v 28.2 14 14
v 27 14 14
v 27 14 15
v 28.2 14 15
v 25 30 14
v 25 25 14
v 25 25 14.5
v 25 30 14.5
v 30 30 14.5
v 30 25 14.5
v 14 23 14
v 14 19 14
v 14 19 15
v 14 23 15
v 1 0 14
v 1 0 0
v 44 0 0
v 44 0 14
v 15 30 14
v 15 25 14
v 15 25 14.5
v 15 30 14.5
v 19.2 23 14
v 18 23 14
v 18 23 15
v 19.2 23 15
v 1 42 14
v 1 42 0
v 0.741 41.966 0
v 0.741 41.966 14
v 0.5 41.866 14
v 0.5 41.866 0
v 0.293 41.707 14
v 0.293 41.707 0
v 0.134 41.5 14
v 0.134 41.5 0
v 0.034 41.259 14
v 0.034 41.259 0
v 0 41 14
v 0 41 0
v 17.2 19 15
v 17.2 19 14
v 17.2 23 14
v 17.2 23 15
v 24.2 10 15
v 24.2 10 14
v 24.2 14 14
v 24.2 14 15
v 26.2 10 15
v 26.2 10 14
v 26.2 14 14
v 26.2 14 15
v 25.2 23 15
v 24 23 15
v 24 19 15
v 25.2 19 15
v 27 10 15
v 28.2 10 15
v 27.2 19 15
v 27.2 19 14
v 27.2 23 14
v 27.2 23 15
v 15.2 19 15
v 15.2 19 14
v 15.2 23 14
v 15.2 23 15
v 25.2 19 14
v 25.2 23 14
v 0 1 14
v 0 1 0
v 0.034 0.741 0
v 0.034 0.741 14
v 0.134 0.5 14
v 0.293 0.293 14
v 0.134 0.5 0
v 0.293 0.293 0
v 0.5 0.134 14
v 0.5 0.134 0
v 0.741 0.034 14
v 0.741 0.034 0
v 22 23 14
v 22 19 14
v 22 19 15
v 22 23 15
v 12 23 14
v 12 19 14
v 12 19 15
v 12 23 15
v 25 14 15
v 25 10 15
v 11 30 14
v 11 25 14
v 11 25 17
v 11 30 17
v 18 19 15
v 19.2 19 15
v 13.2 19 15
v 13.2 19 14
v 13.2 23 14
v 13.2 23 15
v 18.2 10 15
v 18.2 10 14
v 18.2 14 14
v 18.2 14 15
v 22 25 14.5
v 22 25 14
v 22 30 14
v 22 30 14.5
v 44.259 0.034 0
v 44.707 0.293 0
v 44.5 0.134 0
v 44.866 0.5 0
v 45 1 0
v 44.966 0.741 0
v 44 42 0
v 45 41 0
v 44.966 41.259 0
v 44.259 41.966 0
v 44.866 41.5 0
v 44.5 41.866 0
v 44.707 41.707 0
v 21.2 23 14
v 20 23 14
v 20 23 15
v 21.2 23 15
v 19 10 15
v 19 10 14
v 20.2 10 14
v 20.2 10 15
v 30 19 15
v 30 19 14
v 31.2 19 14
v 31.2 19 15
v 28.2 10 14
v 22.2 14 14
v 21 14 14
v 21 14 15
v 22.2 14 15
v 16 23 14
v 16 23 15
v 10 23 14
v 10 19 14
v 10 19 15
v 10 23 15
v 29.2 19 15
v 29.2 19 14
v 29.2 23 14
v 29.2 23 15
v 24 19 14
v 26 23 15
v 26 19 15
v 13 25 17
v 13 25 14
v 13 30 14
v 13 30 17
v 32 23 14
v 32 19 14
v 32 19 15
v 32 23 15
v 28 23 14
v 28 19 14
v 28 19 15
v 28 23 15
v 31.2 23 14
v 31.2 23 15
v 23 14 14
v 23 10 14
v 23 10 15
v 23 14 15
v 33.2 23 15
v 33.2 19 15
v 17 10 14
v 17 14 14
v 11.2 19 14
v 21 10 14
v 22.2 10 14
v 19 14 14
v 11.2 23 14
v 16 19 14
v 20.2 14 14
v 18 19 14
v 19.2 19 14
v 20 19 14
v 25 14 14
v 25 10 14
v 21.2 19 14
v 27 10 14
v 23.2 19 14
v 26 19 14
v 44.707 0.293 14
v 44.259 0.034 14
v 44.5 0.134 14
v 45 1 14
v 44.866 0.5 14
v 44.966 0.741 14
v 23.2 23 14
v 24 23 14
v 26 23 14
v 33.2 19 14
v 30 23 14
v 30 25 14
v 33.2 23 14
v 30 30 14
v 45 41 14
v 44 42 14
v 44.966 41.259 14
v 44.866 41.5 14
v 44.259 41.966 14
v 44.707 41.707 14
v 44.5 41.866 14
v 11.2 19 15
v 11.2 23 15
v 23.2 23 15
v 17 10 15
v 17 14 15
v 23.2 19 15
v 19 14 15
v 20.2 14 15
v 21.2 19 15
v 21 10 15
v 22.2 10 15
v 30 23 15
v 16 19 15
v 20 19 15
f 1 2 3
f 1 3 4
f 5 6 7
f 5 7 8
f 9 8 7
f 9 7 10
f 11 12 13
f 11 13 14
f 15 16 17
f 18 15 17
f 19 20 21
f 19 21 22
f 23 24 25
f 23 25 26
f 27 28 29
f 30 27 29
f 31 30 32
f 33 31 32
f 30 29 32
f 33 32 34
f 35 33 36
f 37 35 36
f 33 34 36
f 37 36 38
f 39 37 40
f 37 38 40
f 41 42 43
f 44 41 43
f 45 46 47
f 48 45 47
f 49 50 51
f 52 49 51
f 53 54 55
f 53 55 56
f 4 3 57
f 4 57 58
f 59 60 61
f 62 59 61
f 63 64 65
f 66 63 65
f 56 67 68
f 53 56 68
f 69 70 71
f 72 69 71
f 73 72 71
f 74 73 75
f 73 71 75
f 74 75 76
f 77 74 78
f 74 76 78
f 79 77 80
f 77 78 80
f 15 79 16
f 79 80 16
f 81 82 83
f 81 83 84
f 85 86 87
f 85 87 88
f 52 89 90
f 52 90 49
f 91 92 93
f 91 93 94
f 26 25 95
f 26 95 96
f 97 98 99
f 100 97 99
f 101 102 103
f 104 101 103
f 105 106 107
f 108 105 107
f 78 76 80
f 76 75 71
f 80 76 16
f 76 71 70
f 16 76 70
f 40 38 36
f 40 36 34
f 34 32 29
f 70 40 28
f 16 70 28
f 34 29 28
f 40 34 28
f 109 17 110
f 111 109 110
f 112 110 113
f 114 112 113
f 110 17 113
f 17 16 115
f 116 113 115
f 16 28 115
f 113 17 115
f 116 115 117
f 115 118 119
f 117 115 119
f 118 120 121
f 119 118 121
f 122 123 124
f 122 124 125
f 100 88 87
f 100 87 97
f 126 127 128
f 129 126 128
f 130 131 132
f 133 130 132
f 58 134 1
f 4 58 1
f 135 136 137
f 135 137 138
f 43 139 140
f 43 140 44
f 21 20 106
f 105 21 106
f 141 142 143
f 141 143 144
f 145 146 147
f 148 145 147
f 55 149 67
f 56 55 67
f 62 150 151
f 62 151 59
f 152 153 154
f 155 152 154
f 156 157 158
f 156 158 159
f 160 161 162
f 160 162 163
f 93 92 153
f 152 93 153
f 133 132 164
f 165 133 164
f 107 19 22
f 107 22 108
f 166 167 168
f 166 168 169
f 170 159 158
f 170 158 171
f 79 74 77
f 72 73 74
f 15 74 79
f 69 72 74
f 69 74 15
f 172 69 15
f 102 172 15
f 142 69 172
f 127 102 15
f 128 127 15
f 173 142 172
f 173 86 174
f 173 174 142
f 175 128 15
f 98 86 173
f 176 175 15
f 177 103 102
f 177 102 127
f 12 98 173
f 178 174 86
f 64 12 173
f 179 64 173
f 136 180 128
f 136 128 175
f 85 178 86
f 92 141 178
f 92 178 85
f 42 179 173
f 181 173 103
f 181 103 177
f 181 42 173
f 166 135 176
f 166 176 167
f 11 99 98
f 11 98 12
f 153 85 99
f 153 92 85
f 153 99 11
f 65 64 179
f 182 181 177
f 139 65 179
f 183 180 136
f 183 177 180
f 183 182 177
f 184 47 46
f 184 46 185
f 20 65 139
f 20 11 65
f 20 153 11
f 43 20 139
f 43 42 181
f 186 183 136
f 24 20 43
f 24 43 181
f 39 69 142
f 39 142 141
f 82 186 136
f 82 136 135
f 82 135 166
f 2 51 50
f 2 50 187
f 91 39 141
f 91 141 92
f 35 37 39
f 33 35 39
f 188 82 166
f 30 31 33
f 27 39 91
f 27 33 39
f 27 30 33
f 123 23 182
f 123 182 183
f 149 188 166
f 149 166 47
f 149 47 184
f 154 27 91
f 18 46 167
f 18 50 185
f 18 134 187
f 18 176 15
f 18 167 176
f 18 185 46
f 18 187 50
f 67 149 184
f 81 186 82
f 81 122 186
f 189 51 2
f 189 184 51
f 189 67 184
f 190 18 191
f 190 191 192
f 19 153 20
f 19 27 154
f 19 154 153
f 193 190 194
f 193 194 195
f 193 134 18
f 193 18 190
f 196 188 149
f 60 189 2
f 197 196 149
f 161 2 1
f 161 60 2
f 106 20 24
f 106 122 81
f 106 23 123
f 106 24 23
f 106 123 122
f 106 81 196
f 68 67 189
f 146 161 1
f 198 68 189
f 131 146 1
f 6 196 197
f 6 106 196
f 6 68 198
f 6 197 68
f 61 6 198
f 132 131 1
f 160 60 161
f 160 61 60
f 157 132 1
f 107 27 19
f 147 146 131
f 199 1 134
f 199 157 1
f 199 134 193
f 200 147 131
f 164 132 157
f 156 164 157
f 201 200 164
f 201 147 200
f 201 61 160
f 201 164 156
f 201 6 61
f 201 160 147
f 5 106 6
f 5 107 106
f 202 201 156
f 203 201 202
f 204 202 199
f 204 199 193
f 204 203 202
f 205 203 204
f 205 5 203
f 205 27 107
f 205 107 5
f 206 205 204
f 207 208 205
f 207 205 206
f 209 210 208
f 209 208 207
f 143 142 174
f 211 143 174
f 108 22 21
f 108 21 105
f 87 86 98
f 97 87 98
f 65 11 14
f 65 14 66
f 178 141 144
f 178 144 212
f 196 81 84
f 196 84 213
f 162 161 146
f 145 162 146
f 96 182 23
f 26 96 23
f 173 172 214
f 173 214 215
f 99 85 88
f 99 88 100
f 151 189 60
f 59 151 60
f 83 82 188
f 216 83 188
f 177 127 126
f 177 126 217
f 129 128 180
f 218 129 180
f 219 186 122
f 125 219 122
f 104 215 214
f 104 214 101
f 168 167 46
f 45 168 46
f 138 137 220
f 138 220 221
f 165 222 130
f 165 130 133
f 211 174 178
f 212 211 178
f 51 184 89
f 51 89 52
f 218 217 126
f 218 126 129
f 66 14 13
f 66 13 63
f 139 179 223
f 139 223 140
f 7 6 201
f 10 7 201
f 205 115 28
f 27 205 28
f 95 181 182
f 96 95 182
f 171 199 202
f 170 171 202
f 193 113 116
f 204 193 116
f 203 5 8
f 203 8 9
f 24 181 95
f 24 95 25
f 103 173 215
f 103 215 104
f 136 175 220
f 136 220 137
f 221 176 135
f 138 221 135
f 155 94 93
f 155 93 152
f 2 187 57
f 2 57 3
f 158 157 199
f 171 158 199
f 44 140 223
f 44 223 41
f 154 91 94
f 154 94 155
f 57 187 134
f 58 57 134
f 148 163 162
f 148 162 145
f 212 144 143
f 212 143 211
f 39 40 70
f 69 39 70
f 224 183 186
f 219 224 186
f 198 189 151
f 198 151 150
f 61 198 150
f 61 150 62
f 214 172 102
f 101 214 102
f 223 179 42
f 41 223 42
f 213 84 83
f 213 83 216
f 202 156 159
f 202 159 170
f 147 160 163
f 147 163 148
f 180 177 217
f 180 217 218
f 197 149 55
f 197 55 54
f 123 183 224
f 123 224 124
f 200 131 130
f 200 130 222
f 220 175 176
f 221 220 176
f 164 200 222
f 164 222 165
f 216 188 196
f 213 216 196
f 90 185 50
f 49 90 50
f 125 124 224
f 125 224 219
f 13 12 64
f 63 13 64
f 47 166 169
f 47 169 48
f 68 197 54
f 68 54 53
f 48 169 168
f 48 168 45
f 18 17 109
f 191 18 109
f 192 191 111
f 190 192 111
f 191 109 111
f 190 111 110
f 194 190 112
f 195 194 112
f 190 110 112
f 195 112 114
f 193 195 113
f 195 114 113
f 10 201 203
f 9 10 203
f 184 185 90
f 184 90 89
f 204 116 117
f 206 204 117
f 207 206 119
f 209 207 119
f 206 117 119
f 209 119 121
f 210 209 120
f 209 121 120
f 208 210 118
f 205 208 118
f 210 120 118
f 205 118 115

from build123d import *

# Parameters (mm, degrees)
BOSS_EXTRUDE1_DEPTH = 14
SKETCH2_W           = 7
SKETCH2_H           = 5
SKETCH2_W_2         = 5
BOSS_EXTRUDE2_DEPTH = 0.5
SKETCH3_W           = 1.2
SKETCH3_H           = 4
BOSS_EXTRUDE3_DEPTH = 1
SKETCH4_W           = 2
SKETCH4_H           = 5
BOSS_EXTRUDE4_DEPTH = 3


with BuildPart() as part:
    # Sketch1 → Boss-Extrude1 (new body)
    with BuildSketch(Plane.XY):
        with BuildLine():
            Line((1, 0), (44, 0))
            ThreePointArc((44, 0), (44.707106781, 0.292893219), (45, 1))
            Line((45, 1), (45, 41))
            ThreePointArc((45, 41), (44.707106781, 41.707106781), (44, 42))
            Line((44, 42), (1, 42))
            ThreePointArc((1, 42), (0.292893219, 41.707106781), (0, 41))
            Line((0, 41), (0, 1))
            ThreePointArc((0, 1), (0.292893219, 0.292893219), (1, 0))
        make_face()
    extrude(amount=BOSS_EXTRUDE1_DEPTH)

    # Sketch2 → Boss-Extrude2 (add)
    with BuildSketch(Plane.XY.offset(14)):
        with Locations((18.5, 27.5)):
            Rectangle(SKETCH2_W, SKETCH2_H)
        with Locations((27.5, 27.5)):
            Rectangle(SKETCH2_W_2, SKETCH2_H)
    extrude(amount=BOSS_EXTRUDE2_DEPTH)

    # Sketch3 → Boss-Extrude3 (add)
    with BuildSketch(Plane.XY.offset(14)):
        with Locations((10.6, 21)):
            Rectangle(SKETCH3_W, SKETCH3_H)
        with Locations((12.6, 21)):
            Rectangle(SKETCH3_W, SKETCH3_H)
        with Locations((14.6, 21)):
            Rectangle(SKETCH3_W, SKETCH3_H)
        with Locations((16.6, 21)):
            Rectangle(SKETCH3_W, SKETCH3_H)
        with Locations((18.6, 21)):
            Rectangle(SKETCH3_W, SKETCH3_H)
        with Locations((20.6, 21)):
            Rectangle(SKETCH3_W, SKETCH3_H)
        with Locations((22.6, 21)):
            Rectangle(SKETCH3_W, SKETCH3_H)
        with Locations((24.6, 21)):
            Rectangle(SKETCH3_W, SKETCH3_H)
        with Locations((26.6, 21)):
            Rectangle(SKETCH3_W, SKETCH3_H)
        with Locations((28.6, 21)):
            Rectangle(SKETCH3_W, SKETCH3_H)
        with Locations((30.6, 21)):
            Rectangle(SKETCH3_W, SKETCH3_H)
        with Locations((32.6, 21)):
            Rectangle(SKETCH3_W, SKETCH3_H)
        with Locations((19.6, 12)):
            Rectangle(SKETCH3_W, SKETCH3_H)
        with Locations((17.6, 12)):
            Rectangle(SKETCH3_W, SKETCH3_H)
        with Locations((21.6, 12)):
            Rectangle(SKETCH3_W, SKETCH3_H)
        with Locations((23.6, 12)):
            Rectangle(SKETCH3_W, SKETCH3_H)
        with Locations((25.6, 12)):
            Rectangle(SKETCH3_W, SKETCH3_H)
        with Locations((27.6, 12)):
            Rectangle(SKETCH3_W, SKETCH3_H)
    extrude(amount=BOSS_EXTRUDE3_DEPTH)

    # Sketch4 → Boss-Extrude4 (add)
    with BuildSketch(Plane.XY.offset(14)):
        with Locations((12, 27.5)):
            Rectangle(SKETCH4_W, SKETCH4_H)
    extrude(amount=BOSS_EXTRUDE4_DEPTH)


solid = part.part
